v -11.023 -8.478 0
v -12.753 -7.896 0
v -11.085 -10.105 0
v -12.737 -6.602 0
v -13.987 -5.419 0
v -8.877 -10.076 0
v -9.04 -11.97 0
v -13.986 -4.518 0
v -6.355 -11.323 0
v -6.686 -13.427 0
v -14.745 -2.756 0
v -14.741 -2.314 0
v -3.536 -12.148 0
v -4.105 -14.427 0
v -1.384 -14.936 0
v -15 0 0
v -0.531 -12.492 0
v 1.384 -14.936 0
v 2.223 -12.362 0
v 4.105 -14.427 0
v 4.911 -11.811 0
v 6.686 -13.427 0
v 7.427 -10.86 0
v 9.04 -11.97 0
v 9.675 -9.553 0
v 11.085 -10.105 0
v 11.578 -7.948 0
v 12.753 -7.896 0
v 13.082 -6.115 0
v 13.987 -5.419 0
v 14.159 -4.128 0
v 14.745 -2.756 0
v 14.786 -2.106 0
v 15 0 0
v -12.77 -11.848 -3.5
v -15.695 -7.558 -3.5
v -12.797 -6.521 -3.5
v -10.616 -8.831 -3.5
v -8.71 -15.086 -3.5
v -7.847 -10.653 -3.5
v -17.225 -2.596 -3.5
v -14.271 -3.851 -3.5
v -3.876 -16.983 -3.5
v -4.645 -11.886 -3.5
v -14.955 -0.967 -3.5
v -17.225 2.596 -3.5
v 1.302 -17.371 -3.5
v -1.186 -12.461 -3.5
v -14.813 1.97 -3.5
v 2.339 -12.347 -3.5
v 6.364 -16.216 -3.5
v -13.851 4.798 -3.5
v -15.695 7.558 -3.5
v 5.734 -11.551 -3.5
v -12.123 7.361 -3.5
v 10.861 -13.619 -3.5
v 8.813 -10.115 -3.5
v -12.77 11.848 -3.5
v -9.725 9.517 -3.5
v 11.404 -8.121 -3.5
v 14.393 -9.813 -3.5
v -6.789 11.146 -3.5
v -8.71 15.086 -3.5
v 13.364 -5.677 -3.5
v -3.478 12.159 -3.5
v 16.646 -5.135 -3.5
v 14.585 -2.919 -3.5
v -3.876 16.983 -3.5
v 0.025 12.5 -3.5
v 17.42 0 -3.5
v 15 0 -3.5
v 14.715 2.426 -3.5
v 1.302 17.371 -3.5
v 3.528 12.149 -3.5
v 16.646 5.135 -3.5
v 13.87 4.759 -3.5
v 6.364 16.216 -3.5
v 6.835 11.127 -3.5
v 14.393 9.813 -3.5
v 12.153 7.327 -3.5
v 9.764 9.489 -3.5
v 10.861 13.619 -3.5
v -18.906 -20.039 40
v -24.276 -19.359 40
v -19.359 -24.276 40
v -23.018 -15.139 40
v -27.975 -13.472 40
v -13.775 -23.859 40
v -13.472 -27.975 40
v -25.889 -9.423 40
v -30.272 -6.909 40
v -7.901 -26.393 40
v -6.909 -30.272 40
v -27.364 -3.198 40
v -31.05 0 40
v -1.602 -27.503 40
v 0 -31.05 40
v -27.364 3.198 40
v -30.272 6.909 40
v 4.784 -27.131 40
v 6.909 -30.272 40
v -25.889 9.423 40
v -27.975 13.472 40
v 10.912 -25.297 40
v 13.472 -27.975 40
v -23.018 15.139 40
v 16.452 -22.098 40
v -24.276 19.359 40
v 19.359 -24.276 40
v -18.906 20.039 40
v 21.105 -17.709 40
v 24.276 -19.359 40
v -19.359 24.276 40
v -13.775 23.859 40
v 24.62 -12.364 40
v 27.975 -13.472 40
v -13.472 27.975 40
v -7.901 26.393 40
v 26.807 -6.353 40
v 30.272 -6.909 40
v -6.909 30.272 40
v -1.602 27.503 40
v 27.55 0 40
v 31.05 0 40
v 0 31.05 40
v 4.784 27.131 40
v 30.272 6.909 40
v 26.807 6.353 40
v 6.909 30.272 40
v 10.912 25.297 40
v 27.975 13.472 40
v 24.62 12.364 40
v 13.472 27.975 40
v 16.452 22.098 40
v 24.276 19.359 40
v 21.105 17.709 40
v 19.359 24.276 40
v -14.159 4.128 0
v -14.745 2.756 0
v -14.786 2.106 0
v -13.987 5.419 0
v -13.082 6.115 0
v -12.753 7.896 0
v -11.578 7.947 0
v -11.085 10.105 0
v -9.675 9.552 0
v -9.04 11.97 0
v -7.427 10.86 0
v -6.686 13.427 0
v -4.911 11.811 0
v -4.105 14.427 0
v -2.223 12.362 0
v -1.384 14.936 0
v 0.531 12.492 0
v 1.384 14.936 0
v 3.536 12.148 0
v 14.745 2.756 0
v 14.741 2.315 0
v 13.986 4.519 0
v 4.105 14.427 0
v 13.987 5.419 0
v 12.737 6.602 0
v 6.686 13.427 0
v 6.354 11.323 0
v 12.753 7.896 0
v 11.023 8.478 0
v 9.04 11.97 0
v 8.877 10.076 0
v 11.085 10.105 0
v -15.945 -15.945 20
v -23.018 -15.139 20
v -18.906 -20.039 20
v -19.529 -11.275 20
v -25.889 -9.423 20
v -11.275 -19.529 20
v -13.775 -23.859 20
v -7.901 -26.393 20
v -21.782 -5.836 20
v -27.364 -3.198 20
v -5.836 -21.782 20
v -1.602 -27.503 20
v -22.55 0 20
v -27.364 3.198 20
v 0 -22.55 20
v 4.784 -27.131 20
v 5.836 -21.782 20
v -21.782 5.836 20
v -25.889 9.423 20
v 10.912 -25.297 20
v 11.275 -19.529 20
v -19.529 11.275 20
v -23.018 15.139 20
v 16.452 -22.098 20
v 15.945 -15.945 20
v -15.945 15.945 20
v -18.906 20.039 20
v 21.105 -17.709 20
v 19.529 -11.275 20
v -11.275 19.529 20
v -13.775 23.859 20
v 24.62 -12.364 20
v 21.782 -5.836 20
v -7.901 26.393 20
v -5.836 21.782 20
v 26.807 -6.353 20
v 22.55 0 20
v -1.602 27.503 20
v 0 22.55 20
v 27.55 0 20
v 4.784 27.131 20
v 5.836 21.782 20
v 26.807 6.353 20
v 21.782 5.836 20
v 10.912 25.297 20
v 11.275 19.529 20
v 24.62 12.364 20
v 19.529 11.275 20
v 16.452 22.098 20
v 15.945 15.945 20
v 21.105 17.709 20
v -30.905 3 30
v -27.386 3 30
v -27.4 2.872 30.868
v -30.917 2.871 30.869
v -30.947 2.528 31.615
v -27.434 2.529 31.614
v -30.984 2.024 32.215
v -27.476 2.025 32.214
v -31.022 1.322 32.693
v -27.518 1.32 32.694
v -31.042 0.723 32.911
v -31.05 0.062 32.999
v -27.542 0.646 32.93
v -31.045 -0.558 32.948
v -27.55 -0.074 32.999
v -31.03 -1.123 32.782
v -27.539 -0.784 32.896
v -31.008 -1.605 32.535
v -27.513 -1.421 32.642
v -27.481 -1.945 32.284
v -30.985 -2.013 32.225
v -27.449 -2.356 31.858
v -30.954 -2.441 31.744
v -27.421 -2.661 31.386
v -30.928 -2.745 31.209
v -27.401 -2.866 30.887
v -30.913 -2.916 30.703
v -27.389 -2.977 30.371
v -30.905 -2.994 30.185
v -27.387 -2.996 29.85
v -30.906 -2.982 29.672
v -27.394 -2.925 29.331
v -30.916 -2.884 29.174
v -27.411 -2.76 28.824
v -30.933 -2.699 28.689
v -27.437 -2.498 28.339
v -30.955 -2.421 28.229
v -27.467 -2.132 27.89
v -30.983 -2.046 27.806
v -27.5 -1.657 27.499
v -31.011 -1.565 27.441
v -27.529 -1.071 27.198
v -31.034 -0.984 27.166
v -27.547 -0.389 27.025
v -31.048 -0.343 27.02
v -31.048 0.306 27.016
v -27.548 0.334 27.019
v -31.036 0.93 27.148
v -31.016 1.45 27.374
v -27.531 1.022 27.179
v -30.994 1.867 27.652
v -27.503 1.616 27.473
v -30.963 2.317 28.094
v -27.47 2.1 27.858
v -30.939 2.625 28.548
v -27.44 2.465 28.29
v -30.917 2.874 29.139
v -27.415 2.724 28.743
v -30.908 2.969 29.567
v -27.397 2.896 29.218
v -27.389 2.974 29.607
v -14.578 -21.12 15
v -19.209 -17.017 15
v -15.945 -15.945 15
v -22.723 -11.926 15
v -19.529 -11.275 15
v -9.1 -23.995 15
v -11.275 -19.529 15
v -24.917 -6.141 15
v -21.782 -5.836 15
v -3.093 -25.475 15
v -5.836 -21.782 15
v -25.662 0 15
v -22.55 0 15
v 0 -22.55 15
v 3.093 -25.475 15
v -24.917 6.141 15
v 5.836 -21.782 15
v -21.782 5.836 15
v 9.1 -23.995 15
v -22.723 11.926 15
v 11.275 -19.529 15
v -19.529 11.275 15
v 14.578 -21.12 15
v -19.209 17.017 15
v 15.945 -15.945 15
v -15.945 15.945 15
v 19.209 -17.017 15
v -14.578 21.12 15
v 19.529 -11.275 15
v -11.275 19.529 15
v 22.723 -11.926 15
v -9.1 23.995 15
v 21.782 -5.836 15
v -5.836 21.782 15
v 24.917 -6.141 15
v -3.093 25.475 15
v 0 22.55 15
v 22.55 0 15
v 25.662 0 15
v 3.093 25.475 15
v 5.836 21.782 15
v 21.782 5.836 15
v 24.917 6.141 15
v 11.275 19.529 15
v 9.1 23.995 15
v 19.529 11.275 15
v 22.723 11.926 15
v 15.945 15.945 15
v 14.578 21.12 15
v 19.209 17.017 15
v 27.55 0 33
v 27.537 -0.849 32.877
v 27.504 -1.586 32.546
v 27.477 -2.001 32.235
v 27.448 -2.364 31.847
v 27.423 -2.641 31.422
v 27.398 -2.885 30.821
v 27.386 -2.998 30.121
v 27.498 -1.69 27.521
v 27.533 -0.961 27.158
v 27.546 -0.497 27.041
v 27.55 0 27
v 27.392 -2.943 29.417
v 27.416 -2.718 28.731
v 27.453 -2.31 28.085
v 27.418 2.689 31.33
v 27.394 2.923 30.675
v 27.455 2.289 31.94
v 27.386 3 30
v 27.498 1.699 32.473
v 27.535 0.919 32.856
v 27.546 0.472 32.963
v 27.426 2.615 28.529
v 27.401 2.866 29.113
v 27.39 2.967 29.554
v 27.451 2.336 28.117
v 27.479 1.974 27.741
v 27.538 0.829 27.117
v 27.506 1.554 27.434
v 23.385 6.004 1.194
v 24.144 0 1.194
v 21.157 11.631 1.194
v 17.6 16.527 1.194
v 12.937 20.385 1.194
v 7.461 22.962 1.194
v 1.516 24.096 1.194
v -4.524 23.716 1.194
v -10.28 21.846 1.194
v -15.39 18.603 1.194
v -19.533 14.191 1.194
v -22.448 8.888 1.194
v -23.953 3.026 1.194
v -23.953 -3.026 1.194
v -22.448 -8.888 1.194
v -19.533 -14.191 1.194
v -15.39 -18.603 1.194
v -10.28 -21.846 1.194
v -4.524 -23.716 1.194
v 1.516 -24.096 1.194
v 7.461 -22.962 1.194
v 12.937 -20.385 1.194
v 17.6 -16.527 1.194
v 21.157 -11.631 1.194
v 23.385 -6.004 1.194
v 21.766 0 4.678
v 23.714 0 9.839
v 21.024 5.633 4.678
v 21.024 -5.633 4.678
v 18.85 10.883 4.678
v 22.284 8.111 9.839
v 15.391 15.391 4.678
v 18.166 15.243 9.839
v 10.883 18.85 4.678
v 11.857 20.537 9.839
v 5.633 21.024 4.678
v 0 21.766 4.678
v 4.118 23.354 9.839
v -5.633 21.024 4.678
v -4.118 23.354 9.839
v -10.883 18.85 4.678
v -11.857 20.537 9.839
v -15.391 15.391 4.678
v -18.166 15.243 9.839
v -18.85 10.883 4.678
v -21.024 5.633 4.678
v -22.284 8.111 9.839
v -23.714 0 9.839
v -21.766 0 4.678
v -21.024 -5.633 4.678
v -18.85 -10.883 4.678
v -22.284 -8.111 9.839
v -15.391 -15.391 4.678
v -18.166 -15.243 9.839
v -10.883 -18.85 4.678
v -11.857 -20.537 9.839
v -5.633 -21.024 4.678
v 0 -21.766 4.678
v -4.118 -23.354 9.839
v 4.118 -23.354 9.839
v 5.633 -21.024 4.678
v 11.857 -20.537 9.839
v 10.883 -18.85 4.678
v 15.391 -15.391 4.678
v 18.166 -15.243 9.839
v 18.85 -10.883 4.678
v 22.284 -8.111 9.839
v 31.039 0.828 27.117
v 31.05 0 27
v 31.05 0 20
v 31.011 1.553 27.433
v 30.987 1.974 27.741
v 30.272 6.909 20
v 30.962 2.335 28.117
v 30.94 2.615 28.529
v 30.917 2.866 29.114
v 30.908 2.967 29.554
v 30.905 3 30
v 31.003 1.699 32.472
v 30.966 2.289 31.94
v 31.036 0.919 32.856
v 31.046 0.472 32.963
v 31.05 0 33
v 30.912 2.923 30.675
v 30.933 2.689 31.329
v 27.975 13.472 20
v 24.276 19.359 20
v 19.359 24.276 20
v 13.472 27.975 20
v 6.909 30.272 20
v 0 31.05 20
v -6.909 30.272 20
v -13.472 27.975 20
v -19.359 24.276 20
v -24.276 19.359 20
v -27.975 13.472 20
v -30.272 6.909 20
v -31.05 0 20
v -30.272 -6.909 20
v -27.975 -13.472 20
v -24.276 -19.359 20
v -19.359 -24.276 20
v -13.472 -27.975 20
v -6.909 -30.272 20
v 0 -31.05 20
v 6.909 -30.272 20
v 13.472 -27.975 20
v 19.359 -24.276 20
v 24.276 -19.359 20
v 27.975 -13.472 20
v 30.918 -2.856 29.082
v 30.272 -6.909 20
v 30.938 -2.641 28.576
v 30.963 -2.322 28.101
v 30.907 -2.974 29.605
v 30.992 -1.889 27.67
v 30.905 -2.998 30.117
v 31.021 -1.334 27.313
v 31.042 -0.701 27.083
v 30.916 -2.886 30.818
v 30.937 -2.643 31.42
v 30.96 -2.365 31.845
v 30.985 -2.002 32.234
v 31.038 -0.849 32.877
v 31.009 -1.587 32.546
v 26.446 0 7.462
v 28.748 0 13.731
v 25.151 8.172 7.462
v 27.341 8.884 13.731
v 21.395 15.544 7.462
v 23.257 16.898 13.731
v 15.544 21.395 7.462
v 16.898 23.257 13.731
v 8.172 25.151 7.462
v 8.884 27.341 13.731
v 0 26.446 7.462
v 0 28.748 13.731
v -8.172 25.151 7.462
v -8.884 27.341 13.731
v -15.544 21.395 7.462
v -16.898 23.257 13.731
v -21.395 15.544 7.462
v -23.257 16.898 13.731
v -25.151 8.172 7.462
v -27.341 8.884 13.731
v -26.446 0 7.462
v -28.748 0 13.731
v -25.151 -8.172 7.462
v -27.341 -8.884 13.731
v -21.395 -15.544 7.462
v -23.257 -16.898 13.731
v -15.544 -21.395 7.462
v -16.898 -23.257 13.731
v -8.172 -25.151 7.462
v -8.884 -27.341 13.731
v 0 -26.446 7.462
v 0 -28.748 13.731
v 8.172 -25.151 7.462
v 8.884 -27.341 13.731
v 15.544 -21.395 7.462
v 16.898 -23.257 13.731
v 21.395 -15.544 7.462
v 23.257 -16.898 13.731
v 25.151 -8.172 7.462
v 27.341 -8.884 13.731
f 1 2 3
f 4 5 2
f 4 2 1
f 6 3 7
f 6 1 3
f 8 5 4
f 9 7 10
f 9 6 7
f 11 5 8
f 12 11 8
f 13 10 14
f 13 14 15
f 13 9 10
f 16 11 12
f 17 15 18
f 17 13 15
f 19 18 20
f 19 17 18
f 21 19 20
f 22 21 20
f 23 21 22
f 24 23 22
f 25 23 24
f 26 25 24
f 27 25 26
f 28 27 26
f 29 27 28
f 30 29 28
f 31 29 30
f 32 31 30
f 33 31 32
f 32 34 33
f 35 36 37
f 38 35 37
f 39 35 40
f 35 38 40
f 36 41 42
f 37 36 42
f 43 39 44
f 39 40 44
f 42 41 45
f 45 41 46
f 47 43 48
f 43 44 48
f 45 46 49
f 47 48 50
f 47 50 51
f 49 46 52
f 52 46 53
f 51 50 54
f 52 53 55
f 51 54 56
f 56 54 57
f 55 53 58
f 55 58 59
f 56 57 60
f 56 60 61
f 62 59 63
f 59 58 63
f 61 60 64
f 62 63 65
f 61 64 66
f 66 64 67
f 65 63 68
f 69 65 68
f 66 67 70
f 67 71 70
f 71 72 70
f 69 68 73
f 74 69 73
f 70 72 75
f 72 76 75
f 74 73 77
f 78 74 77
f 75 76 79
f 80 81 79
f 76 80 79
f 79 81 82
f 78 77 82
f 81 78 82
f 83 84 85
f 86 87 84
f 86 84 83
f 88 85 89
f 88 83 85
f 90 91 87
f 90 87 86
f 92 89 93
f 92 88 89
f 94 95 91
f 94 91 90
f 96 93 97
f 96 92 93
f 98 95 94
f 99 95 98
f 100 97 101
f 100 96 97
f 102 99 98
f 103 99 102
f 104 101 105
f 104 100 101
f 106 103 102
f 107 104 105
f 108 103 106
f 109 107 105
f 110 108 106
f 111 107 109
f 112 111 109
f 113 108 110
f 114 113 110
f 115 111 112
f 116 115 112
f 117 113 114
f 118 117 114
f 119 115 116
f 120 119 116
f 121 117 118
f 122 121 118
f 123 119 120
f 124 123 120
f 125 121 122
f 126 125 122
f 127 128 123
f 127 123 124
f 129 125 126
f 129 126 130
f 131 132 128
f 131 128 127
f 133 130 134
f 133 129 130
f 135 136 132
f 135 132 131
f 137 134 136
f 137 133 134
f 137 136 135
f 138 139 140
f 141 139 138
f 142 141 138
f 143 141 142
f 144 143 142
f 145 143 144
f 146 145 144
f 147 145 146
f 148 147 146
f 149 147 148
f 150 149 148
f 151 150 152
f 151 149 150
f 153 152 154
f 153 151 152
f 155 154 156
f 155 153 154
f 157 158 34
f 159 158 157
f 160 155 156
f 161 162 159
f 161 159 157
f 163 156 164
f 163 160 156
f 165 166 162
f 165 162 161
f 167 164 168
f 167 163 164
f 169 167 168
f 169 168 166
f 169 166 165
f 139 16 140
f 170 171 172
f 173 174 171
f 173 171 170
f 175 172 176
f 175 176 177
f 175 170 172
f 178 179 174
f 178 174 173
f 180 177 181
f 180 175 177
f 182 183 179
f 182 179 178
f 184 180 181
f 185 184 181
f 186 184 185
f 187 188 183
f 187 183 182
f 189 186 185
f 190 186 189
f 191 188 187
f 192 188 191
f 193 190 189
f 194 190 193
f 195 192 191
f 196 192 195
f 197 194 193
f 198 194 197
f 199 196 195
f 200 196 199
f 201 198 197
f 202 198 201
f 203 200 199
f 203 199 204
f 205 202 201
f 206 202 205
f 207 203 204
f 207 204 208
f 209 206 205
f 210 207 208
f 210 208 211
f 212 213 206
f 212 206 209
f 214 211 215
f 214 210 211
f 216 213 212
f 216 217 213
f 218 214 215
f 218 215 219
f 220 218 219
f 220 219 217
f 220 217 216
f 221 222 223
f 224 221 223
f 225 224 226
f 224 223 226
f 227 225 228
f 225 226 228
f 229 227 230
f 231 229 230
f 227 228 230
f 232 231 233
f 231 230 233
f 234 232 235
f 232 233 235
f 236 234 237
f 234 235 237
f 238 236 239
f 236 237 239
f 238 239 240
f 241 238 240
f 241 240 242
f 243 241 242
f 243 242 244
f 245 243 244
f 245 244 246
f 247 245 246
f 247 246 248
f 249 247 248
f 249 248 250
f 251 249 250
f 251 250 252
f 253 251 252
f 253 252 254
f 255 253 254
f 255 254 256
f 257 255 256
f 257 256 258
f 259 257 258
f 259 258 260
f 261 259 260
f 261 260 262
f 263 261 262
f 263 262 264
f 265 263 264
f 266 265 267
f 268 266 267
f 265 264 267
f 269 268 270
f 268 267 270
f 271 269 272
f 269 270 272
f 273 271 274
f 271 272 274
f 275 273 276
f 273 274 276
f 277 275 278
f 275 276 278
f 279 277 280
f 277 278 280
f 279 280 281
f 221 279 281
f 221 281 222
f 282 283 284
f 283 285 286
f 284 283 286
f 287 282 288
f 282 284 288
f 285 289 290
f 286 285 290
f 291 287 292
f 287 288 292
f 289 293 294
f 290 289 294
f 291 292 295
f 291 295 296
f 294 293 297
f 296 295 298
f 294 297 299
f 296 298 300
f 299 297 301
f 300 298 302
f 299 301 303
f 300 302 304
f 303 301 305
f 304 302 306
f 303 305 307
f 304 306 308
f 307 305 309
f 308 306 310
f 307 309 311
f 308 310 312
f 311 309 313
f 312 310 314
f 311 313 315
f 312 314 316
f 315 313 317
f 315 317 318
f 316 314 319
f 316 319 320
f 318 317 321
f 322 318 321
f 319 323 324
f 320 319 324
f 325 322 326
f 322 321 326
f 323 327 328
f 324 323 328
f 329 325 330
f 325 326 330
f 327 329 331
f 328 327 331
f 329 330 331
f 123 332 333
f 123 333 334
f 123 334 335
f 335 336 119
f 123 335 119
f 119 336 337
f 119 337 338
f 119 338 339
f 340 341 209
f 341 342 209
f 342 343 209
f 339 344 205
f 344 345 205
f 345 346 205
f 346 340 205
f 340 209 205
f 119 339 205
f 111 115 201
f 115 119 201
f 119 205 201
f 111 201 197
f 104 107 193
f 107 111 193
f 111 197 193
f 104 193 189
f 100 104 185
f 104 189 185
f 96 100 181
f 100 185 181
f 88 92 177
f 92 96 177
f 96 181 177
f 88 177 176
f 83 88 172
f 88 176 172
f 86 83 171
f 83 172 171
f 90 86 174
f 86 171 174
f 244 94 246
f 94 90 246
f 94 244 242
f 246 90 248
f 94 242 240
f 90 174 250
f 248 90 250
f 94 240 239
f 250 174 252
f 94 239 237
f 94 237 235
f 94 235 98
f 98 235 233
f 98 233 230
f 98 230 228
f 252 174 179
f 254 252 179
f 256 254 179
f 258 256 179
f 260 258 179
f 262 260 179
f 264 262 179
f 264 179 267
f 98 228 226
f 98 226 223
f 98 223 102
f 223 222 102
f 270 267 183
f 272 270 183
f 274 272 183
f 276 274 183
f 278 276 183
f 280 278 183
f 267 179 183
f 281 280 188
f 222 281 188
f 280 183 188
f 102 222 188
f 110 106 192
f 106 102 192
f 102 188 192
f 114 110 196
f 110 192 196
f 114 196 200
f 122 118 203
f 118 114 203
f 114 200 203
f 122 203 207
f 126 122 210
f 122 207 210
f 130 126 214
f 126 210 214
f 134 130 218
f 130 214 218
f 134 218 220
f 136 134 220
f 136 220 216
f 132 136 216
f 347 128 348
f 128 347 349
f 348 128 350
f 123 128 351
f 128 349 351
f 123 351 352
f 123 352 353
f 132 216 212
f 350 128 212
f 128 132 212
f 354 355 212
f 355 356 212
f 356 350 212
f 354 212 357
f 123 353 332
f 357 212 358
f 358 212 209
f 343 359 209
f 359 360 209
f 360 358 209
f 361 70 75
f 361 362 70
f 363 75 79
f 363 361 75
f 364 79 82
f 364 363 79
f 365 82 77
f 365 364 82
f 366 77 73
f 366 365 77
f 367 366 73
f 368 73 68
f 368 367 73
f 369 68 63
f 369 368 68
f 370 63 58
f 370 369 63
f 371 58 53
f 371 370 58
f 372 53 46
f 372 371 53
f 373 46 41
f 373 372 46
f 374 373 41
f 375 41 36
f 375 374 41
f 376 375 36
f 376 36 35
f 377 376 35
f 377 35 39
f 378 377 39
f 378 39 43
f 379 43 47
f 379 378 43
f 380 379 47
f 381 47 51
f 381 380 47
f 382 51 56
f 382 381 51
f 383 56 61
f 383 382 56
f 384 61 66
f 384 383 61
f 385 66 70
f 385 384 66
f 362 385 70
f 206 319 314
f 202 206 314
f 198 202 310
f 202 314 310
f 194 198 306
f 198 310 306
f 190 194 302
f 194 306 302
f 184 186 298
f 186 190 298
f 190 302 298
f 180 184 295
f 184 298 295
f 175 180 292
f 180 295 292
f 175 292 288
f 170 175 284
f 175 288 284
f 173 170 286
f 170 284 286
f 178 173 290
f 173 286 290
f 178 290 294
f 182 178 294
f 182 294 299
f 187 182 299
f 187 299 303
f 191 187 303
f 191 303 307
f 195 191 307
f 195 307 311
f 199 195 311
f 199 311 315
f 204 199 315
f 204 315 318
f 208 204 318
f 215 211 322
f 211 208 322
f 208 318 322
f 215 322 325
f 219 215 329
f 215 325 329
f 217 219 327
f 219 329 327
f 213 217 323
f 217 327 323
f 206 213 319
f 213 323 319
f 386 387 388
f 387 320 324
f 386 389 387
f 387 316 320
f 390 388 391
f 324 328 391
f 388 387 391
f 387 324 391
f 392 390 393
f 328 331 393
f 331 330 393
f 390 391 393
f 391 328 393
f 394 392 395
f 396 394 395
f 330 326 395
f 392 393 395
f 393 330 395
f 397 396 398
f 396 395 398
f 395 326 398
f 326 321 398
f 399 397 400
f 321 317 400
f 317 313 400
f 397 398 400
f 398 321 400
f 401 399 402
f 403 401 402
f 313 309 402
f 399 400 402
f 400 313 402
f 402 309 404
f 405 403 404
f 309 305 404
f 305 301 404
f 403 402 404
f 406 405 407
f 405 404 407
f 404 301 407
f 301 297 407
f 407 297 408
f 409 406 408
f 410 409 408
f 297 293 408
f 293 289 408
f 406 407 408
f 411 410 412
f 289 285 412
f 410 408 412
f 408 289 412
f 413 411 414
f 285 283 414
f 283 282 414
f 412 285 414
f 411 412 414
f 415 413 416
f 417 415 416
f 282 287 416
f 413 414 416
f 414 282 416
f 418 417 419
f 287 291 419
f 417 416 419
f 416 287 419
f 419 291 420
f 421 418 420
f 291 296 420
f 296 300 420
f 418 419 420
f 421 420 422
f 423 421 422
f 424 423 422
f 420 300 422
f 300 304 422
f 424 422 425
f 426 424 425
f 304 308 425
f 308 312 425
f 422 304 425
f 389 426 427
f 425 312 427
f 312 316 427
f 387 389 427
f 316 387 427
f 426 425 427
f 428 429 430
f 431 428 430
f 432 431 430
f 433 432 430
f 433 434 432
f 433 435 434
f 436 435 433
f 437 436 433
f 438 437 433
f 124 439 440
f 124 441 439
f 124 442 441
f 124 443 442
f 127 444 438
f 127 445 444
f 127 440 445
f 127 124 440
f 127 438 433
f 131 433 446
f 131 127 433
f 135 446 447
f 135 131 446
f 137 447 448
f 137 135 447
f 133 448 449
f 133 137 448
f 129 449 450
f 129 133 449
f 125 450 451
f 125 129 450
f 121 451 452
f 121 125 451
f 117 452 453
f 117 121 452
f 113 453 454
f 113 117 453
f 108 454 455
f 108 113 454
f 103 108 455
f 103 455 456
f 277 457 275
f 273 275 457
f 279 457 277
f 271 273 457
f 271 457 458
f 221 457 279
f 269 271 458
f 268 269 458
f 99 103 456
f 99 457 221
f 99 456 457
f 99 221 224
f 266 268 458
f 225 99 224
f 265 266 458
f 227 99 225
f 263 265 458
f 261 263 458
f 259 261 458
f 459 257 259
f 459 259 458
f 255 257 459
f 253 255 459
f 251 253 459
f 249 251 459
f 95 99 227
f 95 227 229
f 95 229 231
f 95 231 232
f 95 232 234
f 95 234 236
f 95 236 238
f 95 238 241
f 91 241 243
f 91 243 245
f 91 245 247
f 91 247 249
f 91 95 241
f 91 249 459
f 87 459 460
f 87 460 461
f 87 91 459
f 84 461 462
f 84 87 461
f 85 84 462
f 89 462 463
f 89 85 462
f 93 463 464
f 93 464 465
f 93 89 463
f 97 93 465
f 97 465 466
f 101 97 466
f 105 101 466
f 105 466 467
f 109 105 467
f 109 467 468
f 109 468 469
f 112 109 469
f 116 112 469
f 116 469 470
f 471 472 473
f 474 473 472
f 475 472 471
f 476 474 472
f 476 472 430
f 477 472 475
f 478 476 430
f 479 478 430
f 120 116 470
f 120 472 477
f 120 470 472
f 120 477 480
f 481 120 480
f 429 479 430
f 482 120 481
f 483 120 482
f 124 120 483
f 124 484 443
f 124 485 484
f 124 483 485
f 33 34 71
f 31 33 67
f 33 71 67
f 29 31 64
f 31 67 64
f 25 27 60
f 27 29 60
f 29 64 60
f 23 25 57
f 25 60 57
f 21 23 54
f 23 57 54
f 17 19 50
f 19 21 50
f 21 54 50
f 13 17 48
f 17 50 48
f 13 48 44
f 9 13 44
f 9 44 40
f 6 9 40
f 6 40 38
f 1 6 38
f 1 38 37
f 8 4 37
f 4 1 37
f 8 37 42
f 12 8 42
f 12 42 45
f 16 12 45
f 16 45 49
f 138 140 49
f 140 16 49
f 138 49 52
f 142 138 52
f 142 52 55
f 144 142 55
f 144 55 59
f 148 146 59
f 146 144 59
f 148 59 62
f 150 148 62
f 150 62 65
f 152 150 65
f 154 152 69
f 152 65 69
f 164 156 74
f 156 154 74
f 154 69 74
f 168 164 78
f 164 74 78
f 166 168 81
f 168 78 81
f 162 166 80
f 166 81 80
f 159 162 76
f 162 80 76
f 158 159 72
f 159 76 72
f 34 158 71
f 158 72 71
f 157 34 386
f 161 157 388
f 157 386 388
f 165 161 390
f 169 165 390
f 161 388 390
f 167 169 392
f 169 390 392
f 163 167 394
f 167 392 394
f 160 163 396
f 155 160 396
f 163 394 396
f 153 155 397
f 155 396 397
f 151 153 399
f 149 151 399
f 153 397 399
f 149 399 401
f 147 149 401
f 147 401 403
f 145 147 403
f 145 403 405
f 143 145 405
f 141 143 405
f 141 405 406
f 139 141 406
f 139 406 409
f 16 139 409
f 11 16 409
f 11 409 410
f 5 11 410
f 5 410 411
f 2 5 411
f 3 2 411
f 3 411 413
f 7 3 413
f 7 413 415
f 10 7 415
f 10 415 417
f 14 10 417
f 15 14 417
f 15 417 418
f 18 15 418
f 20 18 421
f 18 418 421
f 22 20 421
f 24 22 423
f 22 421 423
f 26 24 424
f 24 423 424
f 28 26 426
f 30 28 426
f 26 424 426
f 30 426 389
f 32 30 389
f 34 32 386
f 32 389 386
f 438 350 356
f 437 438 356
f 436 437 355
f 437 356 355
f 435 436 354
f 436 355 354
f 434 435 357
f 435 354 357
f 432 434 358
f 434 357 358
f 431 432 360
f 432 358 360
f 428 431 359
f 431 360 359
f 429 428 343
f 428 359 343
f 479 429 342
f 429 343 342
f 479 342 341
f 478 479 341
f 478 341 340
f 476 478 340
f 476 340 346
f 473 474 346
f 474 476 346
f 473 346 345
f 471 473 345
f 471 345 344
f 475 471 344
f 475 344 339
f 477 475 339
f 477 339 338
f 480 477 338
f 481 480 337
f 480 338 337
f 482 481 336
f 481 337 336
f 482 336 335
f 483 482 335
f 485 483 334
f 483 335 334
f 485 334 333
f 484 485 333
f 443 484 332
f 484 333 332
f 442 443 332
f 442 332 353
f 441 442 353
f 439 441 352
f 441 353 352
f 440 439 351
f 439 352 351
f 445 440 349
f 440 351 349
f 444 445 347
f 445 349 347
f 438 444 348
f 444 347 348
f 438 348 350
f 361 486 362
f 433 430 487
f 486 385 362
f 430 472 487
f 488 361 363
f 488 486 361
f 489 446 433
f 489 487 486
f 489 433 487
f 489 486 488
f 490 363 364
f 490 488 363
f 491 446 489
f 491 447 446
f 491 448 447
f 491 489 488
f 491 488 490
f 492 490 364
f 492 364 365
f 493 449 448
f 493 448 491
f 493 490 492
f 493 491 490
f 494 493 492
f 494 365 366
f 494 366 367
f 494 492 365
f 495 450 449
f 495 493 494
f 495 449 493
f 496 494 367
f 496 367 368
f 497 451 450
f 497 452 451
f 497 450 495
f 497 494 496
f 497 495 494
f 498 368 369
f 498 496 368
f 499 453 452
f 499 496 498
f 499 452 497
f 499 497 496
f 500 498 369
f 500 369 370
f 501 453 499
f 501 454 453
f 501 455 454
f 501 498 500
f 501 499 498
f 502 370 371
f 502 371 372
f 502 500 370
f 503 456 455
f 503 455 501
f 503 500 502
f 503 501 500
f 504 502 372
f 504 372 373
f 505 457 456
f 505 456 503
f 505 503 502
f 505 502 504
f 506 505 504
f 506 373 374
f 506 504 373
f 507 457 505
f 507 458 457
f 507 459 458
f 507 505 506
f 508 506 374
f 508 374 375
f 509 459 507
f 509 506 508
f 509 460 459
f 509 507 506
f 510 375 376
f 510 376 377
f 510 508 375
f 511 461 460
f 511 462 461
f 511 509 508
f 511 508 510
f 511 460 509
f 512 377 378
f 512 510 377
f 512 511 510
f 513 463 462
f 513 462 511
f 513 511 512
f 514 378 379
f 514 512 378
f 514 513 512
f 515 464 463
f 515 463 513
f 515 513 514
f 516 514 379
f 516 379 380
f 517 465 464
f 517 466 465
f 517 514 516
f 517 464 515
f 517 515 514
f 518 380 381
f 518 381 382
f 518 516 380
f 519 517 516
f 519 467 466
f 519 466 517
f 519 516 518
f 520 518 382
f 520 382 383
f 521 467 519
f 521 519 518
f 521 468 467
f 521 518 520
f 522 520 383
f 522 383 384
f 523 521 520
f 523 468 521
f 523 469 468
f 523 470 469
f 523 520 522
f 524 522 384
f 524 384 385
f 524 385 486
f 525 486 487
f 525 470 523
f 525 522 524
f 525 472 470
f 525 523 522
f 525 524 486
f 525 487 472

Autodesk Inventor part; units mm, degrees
ref_plane "YZ Plane" through (0, 0, 0) normal (1, 0, 0) x (0, 1, 0)
ref_plane "XZ Plane" through (0, 0, 0) normal (0, 1, 0) x (-1, 0, 0)
ref_plane "XY Plane" through (0, 0, 0) normal (0, 0, 1) x (1, 0, 0)
sketch "Sketch1" plane through (0, 0, 0) normal (0, 1, 0) x (-1, 0, 0)
  line L0 (-27.55, 40) -> (-27.55, 20)
  line L1 (-25.6625, 15) -> (-21.7659, 4.6778)
  line L2 (0, 0) -> (0, 34.8486) construction
  line L3 (-15, 0) -> (0, 0)
  line L4 (0, -3.5) -> (-17.4198, -3.5)
  line L5 (-24.1435, 1.1935) -> (-31.05, 20)
  line L6 (-31.05, 20) -> (-31.05, 40)
  line L7 (0, -3.5) -> (0, 0)
  line L8 (-27.55, 40) -> (-31.05, 40)
  line L9 (-27.55, 20) -> (-22.55, 20)
  line L10 (-22.55, 20) -> (-22.55, 15)
  line L11 (-22.55, 15) -> (-25.6625, 15)
  line L12 (-15, 0) -> (-21.7659, 4.6778)
  line L13 (-17.4198, -3.5) -> (-24.1435, 1.1935)
  point P0 (-20, 0)
  point P1 (-22.4198, -3.5)
  dimension "d17" = 55.1
  dimension "d19" = 20
  dimension "d32" = 40
  dimension "d37" = 20
  dimension "d38" = 5
  dimension "d39" = 5
  dimension "d40" = 90
  dimension "d41" = 5
  dimension "d42" = 5
  dimension "d43" = 5
  dimension "d44" = 5
revolve "Revolution1" add sketch "Sketch1" angle 360 about axis through (0, 0, 0) along (0, 0, 1)
sketch "Sketch5" plane through (0, 0, 0) normal (1, 0, 0) x (0, 1, 0)
  line L0 (27.55, 40) -> (-27.55, 40) projected
  line L1 (0, 40) -> (0, 30) construction
  circle A0 centre (0, 30) radius 3
  point P0 (0, 0)
  dimension "d27" = 10
  dimension "d28" = 6
extrude "Extrusion4" cut sketch "Sketch5" along normal through all both and the other way through all
sketch "Sketch6" plane through (0, 0, -3.5) normal (0, 0, -1) x (-1, 0, 0)
  ellipse E0 centre (0, 0) end of major axis (-15, 0) minor radius 12.5
  dimension "d33" = 12.5
  dimension "d34" = 15
extrude "Extrusion5" cut sketch "Sketch6" against normal blind 10
equation "\"d42\" = d41"
equation "\"d43\" = d41"
equation "\"d44\" = d43"
properties part number "NOZZLE-ELIPTICO"
